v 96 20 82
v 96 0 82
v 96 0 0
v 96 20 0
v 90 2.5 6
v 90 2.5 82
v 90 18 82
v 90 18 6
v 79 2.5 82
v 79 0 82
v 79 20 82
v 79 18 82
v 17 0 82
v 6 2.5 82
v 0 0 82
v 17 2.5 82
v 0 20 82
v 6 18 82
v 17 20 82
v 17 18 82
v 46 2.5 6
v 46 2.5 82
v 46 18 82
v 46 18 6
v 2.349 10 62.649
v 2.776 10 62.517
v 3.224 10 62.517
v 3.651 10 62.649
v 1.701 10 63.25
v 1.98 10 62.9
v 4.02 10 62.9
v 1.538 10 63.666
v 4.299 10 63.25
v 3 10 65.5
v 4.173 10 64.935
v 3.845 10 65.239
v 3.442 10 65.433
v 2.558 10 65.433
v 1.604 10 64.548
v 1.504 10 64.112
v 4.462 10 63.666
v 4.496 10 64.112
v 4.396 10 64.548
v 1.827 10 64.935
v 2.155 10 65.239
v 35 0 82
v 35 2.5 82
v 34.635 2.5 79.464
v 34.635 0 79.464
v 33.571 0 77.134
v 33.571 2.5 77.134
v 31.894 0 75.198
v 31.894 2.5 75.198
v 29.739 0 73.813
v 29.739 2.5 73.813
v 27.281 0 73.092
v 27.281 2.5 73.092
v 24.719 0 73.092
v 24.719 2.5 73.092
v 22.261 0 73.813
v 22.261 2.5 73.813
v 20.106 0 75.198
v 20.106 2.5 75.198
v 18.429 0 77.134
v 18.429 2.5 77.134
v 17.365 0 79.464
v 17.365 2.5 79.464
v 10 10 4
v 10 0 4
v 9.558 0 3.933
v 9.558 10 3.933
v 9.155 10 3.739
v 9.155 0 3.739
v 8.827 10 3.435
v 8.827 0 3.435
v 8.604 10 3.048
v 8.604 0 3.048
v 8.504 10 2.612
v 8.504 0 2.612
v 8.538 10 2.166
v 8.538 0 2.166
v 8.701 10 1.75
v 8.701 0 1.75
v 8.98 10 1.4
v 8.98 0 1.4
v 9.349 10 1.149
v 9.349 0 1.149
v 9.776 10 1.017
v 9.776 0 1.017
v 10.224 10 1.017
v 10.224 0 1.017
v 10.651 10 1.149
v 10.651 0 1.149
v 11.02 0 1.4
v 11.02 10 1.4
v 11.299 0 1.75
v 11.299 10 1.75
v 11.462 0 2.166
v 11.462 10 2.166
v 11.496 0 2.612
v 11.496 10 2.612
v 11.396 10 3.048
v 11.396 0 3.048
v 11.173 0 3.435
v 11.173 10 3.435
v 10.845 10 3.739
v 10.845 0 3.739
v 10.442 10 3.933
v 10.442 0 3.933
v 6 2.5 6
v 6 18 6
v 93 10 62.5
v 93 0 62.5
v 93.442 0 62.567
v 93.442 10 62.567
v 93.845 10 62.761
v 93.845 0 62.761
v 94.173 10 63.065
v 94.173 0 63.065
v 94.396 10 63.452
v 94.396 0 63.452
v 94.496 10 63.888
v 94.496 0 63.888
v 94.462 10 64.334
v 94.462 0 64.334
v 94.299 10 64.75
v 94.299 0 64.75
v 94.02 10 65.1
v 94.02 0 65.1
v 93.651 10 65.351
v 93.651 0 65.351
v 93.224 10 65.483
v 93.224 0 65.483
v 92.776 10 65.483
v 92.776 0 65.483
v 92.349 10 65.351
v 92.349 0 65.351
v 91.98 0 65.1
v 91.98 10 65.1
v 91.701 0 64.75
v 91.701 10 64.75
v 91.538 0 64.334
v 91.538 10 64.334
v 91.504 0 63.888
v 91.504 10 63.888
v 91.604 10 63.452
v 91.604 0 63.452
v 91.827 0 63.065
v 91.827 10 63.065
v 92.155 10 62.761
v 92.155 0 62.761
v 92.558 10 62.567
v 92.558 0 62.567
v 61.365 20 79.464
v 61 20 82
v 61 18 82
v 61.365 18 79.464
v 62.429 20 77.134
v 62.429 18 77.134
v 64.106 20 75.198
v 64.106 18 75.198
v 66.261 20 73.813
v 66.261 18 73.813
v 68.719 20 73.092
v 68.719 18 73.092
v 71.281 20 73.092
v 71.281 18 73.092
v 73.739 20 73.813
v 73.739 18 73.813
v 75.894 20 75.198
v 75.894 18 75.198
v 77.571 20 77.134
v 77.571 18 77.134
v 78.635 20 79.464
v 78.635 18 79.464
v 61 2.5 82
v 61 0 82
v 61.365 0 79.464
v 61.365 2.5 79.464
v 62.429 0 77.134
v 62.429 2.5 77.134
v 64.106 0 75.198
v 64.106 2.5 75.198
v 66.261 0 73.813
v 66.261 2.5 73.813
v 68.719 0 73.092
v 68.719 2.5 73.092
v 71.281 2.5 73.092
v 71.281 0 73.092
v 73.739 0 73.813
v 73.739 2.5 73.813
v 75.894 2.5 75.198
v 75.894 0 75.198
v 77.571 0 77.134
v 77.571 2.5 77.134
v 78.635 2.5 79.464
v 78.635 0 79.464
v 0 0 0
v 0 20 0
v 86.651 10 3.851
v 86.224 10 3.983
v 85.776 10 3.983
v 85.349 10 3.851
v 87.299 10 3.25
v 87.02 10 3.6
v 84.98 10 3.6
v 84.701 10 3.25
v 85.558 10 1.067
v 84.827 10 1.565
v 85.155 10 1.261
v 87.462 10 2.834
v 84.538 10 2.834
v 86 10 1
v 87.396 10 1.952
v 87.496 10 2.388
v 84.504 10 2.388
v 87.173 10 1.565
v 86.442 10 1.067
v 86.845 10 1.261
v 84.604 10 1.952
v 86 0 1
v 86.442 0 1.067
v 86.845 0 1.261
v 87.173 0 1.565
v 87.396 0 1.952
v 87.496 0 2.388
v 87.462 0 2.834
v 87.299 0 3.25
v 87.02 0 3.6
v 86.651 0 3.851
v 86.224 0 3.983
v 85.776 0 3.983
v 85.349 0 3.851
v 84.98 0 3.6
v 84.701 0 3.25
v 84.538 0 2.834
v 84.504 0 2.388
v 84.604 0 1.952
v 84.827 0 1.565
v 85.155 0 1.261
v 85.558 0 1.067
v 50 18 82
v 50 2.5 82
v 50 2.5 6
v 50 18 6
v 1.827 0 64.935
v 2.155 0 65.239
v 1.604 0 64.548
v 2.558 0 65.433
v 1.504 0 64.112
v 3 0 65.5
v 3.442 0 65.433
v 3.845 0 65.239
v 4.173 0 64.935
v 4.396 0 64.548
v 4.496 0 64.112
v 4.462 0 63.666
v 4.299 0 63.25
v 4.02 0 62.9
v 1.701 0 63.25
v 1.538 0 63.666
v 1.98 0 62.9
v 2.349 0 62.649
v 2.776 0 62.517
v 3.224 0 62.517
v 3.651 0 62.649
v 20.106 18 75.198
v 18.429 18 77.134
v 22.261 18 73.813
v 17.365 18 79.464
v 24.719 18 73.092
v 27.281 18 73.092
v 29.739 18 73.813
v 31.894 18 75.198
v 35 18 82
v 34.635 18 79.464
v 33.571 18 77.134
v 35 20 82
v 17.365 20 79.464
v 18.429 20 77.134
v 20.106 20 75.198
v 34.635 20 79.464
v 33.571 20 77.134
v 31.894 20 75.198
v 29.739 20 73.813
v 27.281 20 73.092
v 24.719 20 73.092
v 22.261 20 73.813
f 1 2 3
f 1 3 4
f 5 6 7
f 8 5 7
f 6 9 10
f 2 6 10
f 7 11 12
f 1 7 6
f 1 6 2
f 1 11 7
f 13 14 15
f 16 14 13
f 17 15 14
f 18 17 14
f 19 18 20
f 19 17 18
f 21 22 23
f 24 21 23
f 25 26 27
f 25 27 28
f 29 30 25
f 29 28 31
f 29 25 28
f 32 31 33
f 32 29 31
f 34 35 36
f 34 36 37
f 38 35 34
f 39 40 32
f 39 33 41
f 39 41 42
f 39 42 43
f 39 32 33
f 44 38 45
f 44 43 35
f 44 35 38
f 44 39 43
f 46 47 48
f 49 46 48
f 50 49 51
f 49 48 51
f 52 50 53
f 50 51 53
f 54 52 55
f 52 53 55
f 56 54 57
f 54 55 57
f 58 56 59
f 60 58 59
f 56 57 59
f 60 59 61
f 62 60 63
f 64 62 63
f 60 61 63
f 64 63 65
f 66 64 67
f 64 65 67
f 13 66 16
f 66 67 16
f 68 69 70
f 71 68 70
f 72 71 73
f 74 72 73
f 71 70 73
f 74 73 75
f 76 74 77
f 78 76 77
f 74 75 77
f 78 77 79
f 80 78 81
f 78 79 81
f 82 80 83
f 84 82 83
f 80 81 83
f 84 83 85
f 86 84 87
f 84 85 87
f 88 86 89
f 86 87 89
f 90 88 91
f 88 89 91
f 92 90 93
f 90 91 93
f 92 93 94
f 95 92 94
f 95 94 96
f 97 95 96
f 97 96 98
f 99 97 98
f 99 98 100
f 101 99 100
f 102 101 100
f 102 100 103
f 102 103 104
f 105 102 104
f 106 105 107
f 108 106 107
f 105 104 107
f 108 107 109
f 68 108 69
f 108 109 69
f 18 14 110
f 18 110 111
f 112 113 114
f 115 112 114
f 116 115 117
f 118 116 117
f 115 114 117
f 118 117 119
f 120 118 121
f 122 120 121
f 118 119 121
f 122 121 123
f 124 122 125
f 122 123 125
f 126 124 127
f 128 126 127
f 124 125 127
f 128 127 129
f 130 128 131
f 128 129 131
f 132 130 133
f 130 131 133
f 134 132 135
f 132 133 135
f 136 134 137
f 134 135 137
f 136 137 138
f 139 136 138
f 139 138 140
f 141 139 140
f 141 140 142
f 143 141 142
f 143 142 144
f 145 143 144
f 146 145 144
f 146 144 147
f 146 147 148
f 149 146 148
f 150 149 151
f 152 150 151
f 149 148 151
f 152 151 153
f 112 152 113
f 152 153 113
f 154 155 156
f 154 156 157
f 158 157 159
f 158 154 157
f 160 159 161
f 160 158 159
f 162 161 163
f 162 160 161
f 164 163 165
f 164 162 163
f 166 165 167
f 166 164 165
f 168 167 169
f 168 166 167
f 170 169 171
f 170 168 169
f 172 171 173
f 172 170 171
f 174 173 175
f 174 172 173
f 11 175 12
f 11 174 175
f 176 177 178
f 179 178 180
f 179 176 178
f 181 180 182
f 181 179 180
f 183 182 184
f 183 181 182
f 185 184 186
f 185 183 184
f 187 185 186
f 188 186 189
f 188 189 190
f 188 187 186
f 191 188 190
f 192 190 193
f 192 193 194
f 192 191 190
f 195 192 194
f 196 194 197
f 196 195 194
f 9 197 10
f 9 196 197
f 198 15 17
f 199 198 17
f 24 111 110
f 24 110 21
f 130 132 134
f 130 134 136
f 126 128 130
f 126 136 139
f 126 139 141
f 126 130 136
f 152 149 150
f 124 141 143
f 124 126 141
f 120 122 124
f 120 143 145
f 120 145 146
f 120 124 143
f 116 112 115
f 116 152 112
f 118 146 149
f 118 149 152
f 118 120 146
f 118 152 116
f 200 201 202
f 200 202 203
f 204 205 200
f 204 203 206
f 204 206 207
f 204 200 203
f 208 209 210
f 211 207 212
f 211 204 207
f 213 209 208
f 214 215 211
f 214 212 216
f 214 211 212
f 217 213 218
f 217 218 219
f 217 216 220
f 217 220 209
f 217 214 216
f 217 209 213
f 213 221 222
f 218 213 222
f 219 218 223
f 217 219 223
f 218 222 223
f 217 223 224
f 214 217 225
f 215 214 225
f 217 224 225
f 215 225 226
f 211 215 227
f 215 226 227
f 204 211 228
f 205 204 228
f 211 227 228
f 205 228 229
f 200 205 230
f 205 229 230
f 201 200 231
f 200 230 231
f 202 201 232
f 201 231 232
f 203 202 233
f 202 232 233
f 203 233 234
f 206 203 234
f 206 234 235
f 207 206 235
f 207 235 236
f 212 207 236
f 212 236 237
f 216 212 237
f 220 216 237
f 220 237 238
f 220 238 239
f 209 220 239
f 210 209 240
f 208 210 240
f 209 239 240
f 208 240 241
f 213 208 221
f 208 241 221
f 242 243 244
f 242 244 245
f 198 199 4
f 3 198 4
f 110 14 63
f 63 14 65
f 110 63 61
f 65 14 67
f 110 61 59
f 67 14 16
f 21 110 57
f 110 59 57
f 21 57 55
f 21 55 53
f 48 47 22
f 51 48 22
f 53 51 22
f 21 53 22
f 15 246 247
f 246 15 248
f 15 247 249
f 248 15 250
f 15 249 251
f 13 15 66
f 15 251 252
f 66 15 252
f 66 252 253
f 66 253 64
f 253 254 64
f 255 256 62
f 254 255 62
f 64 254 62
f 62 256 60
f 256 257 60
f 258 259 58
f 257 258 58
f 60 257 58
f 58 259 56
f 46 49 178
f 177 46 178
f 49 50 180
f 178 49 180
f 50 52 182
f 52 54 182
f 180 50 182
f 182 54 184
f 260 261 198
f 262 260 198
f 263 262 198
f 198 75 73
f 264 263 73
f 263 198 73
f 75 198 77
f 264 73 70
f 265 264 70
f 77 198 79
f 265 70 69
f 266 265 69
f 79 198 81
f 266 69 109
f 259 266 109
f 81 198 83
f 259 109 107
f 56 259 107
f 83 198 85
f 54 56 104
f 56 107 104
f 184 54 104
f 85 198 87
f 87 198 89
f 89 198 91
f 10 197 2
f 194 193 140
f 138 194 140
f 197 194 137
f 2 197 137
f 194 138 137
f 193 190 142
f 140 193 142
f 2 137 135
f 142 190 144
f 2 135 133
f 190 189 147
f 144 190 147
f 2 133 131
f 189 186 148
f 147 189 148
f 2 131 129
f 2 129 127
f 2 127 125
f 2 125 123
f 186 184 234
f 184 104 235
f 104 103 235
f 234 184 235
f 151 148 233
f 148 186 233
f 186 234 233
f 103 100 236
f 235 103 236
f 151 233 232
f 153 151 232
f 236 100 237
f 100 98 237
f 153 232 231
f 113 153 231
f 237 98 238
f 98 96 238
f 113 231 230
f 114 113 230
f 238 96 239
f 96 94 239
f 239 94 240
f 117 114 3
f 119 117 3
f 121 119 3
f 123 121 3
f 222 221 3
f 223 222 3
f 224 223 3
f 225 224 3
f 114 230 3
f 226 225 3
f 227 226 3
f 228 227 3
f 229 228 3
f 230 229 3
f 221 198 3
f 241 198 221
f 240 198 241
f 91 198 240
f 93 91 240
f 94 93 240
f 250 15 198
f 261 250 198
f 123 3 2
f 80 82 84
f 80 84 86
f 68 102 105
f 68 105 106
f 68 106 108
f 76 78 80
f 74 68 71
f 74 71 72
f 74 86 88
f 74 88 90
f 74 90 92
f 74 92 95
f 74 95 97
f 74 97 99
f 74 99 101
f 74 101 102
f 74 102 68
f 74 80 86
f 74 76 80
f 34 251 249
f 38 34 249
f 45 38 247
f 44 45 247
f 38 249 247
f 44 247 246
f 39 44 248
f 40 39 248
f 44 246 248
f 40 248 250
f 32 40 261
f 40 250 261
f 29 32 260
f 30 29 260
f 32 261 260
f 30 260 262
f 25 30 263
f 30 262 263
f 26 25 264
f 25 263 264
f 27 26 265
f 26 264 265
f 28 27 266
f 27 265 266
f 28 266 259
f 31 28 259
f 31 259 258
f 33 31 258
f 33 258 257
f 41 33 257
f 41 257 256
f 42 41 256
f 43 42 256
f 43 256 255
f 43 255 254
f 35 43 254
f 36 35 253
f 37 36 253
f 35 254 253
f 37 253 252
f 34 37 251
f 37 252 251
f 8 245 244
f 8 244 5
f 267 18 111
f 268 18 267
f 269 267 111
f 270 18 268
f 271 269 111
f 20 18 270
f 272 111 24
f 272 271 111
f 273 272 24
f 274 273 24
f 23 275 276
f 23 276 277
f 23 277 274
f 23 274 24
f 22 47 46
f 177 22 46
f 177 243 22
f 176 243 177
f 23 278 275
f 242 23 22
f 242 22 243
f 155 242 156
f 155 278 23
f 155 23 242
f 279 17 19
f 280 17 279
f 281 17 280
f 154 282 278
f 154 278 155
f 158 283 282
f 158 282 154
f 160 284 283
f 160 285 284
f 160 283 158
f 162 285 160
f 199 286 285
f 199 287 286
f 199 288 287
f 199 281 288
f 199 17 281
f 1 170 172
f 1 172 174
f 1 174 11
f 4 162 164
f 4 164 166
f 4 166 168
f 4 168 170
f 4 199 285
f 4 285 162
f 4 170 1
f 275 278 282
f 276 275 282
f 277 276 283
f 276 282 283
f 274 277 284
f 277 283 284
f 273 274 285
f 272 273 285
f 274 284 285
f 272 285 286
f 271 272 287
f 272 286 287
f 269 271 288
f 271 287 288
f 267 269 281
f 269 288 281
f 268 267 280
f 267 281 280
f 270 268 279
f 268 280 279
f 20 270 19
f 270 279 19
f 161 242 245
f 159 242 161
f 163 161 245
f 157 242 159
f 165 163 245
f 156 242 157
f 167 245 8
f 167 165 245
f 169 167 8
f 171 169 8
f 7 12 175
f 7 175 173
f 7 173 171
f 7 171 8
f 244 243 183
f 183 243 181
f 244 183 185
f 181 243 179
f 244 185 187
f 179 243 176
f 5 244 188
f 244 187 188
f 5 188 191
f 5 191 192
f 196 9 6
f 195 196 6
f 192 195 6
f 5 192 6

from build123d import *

# Parameters (mm, degrees)
SKETCH_1_W          = 96
SKETCH_1_H          = 20
EXTRUDE_1_DEPTH     = 82
CUT_EXTRUDE_2_DEPTH = 20
SKETCH_3_W          = 40
SKETCH_3_H          = 15.5
CUT_EXTRUDE_3_DEPTH = 76
SKETCH_6_R          = 1.5
CUT_EXTRUDE_5_DEPTH = 10


with BuildPart() as part:
    # 草图1 → 凸台-拉伸1 (new body)
    with BuildSketch(Plane.XY):
        with Locations((48, 10)):
            Rectangle(SKETCH_1_W, SKETCH_1_H)
    extrude(amount=EXTRUDE_1_DEPTH)

    # 草图2 → 切除-拉伸2 (cut)
    with BuildSketch(Plane(origin=(0, 20, 0), x_dir=(1, 0, 0), z_dir=(0, 1, 0))):
        with BuildLine():
            Line((17, -82), (35, -82))
            ThreePointArc((35, -82), (26, -73), (17, -82))
        make_face()
        with BuildLine():
            Line((79, -82), (61, -82))
            ThreePointArc((61, -82), (70, -73), (79, -82))
        make_face()
    extrude(amount=-CUT_EXTRUDE_2_DEPTH, mode=Mode.SUBTRACT)

    # 草图3 → 切除-拉伸3 (cut)
    with BuildSketch(Plane.XY.offset(82)):
        with Locations((26, 10.25)):
            Rectangle(SKETCH_3_W, SKETCH_3_H)
        with Locations((149, 10.25)):
            Rectangle(SKETCH_3_W, SKETCH_3_H)
        with Locations((70, 10.25)):
            Rectangle(SKETCH_3_W, SKETCH_3_H)
    extrude(amount=-CUT_EXTRUDE_3_DEPTH, mode=Mode.SUBTRACT)

    # 草图6 → 切除-拉伸5 (cut)
    with BuildSketch(Plane.XZ):
        with Locations(Location((86, 2.5, 0), (0, 0, 270))):
            Circle(SKETCH_6_R)
        with Locations(Location((10, 2.5, 0), (0, 0, 90))):
            Circle(SKETCH_6_R)
        with Locations(Location((93, 64, 0), (0, 0, 270))):
            Circle(SKETCH_6_R)
        with Locations(Location((3, 64, 0), (0, 0, 90))):
            Circle(SKETCH_6_R)
    extrude(amount=-CUT_EXTRUDE_5_DEPTH, mode=Mode.SUBTRACT)


solid = part.part
